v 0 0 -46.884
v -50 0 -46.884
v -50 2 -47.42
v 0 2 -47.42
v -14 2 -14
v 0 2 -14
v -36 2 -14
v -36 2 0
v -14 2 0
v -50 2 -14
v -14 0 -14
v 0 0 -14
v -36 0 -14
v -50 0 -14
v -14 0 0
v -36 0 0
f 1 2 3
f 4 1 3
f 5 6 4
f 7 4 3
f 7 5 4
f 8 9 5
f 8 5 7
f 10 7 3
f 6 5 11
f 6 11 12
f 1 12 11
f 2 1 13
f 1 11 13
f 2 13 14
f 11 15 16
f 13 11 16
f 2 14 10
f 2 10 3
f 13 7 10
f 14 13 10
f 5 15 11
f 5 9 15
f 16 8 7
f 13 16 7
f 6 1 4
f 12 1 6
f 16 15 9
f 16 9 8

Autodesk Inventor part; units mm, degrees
ref_plane "YZ Plane" through (0, 0, 0) normal (1, 0, 0) x (0, 1, 0)
ref_plane "XZ Plane" through (0, 0, 0) normal (0, 1, 0) x (-1, 0, 0)
ref_plane "XY Plane" through (0, 0, 0) normal (0, 0, 1) x (1, 0, 0)
sketch "Szkic1" plane through (0, 0, 0) normal (0, 1, 0) x (-1, 0, 0)
  line L0 (0, 0) -> (50, 0)
  line L1 (50, 0) -> (50, -50)
  line L2 (50, -50) -> (0, -50)
  line L3 (0, -50) -> (0, 0)
  dimension "d0" = 50
  dimension "d1" = 50
extrude "Wyciągnięcie proste1" add sketch "Szkic1" along normal blind 2
sketch "Szkic2" plane through (0, 2, 0) normal (0, 1, 0) x (1, 0, 0)
  line L0 (0, 50) -> (-50, 50) projected
  line L1 (-50, 50) -> (-50, 0) projected
  line L2 (-50, 0) -> (0, 0) projected
  line L3 (0, 0) -> (0, 50) projected
  line L4 (0, 0) -> (-14, 0)
  line L5 (-14, 0) -> (-14, 14)
  line L6 (-14, 14) -> (0, 14)
  line L7 (0, 14) -> (0, 0)
  line L8 (-50, 0) -> (-36, 0)
  line L9 (-36, 0) -> (-36, 14)
  line L10 (-36, 14) -> (-50, 14)
  line L11 (-50, 14) -> (-50, 0)
  point P0 (-36, 0)
  point P1 (0, 14)
  point P2 (-14, 0)
  dimension "d4" = 14
  dimension "d5" = 14
  dimension "d8" = 14
  dimension "d11" = 14
extrude "Wyciągnięcie proste2" cut sketch "Szkic2" against normal through all contours L3 L2 L5 L6 | L10 L9 L2 L1
sketch "Szkic4" plane through (-50, 0, -50) normal (-1, 0, 0) x (0, 0, 1)
  line L0 (36, 0) -> (36, 2) projected
  line L1 (0, 2) -> (36, 2) projected
  line L2 (0, 0) -> (0, 2) projected
  line L3 (0, 0) -> (36, 0) projected
  line L4 (7.6305, -16.85) -> (2.0706, 3.9) projected
  line L5 (2.0706, 3.9) -> (0, 3.9) projected
  line L6 (0, 3.9) -> (5.5599, -16.85) projected
  line L7 (5.5599, -16.85) -> (7.6305, -16.85) projected
  point P0 (50, 0)
  point P1 (3.1156, 0)
  point P2 (2.5797, 2)
extrude "Wyciągnięcie proste4" cut sketch "Szkic4" against normal through all contours L3 L6 L1 L4 | L3 L2 L1 L6
properties part number "spod" material "Stal, węglowa"
